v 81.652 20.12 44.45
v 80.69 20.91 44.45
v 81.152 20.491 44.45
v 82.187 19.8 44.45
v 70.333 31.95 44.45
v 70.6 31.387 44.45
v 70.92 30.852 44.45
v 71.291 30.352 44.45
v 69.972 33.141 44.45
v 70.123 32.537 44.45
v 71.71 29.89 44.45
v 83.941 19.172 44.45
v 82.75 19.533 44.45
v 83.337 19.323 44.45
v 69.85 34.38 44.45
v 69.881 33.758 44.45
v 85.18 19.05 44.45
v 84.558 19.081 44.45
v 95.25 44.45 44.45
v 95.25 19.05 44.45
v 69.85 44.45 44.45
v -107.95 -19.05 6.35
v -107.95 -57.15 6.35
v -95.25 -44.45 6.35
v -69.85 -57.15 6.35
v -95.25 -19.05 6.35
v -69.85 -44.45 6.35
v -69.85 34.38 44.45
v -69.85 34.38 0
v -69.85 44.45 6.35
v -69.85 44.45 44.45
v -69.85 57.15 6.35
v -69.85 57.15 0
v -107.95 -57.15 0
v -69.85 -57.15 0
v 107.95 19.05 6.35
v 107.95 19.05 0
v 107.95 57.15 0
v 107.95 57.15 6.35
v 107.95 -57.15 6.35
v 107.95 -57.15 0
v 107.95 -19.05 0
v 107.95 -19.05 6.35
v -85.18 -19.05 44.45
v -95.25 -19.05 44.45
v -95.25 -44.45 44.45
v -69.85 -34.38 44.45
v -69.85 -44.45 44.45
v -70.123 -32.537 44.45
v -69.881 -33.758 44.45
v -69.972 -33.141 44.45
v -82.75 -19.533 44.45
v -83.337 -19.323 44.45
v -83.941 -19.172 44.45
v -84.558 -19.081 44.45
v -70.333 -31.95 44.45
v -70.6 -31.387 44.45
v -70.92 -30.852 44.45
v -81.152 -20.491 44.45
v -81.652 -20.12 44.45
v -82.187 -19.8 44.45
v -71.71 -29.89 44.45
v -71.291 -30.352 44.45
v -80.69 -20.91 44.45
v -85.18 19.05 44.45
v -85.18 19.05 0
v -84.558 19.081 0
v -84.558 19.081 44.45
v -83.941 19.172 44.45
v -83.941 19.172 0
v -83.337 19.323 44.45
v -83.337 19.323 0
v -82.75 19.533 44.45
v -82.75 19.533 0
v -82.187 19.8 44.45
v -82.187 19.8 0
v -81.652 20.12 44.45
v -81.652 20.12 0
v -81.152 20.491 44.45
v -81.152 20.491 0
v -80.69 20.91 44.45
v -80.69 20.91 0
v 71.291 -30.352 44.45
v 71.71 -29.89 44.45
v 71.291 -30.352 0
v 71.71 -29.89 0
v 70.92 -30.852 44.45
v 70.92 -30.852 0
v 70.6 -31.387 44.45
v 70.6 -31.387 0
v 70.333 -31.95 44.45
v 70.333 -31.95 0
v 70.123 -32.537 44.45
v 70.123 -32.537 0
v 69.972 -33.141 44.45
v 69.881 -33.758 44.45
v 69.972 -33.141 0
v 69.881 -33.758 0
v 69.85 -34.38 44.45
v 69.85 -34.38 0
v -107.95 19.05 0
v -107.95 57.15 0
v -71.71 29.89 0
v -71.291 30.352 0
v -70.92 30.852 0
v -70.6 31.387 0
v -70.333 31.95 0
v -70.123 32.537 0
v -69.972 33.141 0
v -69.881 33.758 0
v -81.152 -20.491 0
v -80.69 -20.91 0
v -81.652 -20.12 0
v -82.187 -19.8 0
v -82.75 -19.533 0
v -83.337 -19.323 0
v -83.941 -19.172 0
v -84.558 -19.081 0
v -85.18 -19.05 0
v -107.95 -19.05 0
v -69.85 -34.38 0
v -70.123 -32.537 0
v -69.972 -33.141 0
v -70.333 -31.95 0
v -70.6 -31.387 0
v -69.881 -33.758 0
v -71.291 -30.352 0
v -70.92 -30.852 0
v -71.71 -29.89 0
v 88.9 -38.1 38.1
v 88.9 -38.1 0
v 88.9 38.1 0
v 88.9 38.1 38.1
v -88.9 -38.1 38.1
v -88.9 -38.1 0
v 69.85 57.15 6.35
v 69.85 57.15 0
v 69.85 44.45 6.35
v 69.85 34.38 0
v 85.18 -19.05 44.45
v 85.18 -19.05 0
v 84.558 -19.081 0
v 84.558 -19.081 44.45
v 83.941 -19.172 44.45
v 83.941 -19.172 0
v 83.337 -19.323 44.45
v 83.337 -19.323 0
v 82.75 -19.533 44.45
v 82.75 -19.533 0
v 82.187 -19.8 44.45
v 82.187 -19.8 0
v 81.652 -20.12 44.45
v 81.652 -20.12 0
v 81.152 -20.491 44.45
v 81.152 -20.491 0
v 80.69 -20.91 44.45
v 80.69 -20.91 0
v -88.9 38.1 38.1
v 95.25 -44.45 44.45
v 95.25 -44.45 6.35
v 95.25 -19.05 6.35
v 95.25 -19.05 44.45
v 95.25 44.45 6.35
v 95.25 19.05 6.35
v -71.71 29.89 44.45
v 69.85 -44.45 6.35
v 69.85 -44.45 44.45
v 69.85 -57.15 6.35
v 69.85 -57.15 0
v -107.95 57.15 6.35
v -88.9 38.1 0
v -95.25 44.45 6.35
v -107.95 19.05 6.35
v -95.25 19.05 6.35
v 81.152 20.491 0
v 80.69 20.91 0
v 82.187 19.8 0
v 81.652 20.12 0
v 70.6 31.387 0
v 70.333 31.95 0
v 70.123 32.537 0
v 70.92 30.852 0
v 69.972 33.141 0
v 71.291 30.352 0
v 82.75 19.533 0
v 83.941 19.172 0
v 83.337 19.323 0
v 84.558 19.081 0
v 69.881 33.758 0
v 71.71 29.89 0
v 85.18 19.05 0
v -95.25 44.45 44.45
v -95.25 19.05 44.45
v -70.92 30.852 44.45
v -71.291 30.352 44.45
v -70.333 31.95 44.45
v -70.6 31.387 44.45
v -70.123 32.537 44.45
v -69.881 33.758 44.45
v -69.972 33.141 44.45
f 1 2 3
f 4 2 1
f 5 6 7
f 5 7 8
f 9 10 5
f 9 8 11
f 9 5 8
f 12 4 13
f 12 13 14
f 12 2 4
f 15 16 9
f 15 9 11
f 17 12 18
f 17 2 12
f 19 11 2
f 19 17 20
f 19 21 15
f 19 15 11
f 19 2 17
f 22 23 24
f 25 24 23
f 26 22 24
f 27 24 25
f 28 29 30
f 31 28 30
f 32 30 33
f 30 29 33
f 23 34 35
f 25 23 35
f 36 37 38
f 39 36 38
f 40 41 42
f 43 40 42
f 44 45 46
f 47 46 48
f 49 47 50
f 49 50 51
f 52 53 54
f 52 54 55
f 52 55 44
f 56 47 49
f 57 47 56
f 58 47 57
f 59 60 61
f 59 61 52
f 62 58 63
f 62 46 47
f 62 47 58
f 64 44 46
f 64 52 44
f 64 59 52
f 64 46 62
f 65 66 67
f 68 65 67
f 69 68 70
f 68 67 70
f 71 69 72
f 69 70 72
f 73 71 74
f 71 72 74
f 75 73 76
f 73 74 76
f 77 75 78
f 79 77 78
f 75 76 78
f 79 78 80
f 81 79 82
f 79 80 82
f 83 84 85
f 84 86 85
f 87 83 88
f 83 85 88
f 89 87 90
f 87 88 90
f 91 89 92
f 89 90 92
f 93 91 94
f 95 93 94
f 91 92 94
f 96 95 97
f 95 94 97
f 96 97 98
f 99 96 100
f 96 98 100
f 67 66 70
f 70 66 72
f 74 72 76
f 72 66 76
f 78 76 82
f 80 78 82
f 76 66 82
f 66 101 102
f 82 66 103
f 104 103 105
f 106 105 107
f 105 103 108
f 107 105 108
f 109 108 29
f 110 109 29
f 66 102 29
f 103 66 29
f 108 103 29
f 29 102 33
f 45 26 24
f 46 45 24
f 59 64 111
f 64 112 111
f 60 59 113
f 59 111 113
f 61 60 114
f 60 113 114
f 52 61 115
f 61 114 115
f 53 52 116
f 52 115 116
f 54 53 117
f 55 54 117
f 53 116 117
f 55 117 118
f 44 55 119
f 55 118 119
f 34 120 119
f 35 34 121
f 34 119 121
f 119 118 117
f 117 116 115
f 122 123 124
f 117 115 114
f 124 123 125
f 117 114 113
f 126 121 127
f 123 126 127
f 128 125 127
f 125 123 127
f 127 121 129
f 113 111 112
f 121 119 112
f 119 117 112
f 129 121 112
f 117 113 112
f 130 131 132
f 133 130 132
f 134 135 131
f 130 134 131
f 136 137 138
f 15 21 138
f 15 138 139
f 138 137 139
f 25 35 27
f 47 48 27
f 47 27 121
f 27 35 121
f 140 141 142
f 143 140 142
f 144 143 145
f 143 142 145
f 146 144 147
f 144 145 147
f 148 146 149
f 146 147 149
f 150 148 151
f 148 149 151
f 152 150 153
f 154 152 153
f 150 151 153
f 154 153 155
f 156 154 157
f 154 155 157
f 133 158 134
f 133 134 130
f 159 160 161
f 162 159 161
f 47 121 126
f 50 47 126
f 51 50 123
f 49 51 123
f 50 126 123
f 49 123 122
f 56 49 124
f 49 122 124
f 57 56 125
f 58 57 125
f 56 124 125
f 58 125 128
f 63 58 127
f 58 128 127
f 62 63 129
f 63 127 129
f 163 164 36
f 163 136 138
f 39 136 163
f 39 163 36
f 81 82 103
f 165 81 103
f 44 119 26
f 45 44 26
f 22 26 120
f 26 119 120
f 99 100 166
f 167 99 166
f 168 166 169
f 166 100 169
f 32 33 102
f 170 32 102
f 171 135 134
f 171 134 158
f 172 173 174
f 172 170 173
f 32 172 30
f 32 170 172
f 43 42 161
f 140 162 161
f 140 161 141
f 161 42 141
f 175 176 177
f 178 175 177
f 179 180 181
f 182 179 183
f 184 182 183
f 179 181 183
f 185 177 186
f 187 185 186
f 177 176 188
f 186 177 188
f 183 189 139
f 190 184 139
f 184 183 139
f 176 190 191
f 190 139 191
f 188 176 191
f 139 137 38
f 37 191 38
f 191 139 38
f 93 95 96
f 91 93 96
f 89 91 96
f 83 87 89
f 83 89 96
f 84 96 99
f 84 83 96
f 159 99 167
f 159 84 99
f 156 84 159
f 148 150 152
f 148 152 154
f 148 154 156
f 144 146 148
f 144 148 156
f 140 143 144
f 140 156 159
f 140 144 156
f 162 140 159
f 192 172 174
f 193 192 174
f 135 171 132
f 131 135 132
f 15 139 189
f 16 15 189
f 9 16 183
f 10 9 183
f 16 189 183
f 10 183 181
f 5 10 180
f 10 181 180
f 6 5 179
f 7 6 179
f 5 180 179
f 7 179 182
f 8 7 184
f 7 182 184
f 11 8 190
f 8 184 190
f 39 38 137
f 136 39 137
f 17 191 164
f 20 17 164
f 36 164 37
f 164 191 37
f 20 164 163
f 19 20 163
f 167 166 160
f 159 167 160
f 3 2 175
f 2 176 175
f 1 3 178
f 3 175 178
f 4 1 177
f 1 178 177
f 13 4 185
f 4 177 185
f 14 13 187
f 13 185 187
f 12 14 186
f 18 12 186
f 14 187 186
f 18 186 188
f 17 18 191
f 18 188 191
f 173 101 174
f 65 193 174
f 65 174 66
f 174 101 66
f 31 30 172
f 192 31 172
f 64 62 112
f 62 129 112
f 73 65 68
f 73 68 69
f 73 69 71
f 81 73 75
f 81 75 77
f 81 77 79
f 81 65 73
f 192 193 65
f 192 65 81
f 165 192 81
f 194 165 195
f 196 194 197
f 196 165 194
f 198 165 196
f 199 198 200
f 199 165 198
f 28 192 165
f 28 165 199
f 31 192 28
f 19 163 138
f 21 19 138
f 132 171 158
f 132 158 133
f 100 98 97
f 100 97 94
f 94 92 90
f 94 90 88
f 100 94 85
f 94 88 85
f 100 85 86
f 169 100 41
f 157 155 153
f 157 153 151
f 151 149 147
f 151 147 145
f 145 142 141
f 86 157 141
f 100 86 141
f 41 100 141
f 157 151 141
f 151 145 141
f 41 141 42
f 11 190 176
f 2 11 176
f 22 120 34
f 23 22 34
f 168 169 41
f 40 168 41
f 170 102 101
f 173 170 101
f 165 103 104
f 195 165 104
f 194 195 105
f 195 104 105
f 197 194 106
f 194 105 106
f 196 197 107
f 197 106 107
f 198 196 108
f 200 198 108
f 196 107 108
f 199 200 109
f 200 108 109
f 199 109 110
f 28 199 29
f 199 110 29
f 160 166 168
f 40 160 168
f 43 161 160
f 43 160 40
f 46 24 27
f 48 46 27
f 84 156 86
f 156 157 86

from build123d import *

# Parameters (mm, degrees)
F0_W     = 177.8
F0_H     = 76.2
F1_DEPTH = 38.1
F3_DEPTH = 38.1
F5_DEPTH = 6.35
F6_DEPTH = 6.35


with BuildPart() as f1:
    # F0 (on Top) → F1 (new body)
    with BuildSketch(Plane.XY):
        Rectangle(F0_W, F0_H)
    extrude(amount=F1_DEPTH)


with BuildPart() as f3:
    # F2 (on Top) → F3 (new body, through all)
    with BuildSketch(Plane.XY):
        Polygon((-69.85, -38.1), (-88.9, -38.1), (-88.9, -19.05), (-95.25, -19.05), (-95.25, -44.45), (-69.85, -44.45), align=None)
        with BuildLine():
            Line((-88.9, -19.05), (-88.9, -38.1))
            Line((-88.9, -38.1), (-69.85, -38.1))
            Line((-69.85, -38.1), (-69.85, -34.3802561211))
            ThreePointArc((-69.85, -34.3802561211), (-70.3333649686, -31.9502163256), (-71.7098719395, -29.8901280605))
            Line((-71.7098719395, -29.8901280605), (-80.6901280605, -20.9098719395))
            ThreePointArc((-80.6901280605, -20.9098719395), (-82.7502163256, -19.5333649686), (-85.1802561211, -19.05))
            Line((-85.1802561211, -19.05), (-88.9, -19.05))
        make_face()
    extrude(amount=F3_DEPTH)

    # F4 (on face) → F5 (join)
    with BuildSketch(Plane.XY.offset(38.1)):
        with BuildLine():
            Line((-88.9, -38.1), (-69.85, -38.1))
            Line((-69.85, -38.1), (-69.85, -34.3802561211))
            ThreePointArc((-69.85, -34.3802561211), (-70.3333649686, -31.9502163256), (-71.7098719395, -29.8901280605))
            Line((-71.7098719395, -29.8901280605), (-80.6901280605, -20.9098719395))
            ThreePointArc((-80.6901280605, -20.9098719395), (-82.7502163256, -19.5333649686), (-85.1802561211, -19.05))
            Line((-85.1802561211, -19.05), (-88.9, -19.05))
            Line((-88.9, -19.05), (-88.9, -38.1))
        make_face()
        Polygon((-69.85, -44.45), (-69.85, -38.1), (-88.9, -38.1), (-88.9, -19.05), (-95.25, -19.05), (-95.25, -44.45), align=None)
    extrude(amount=F5_DEPTH)

    # F2 (on Top) → F6, piece 4 (join)
    with BuildSketch(Plane.XY):
        Polygon((-69.85, -57.15), (-69.85, -44.45), (-95.25, -44.45), (-95.25, -19.05), (-107.95, -19.05), (-107.95, -57.15), align=None)
    extrude(amount=F6_DEPTH)


with BuildPart() as f3b:
    # F2 (on Top) → F3, piece 2 (new body, through all)
    with BuildSketch(Plane.XY):
        with BuildLine():
            Line((-88.9, 38.1), (-88.9, 19.05))
            Line((-88.9, 19.05), (-85.1802561211, 19.05))
            ThreePointArc((-85.1802561211, 19.05), (-82.7502163256, 19.5333649686), (-80.6901280605, 20.9098719395))
            Line((-80.6901280605, 20.9098719395), (-71.7098719395, 29.8901280605))
            ThreePointArc((-71.7098719395, 29.8901280605), (-70.3333649686, 31.9502163256), (-69.85, 34.3802561211))
            Line((-69.85, 34.3802561211), (-69.85, 38.1))
            Line((-69.85, 38.1), (-88.9, 38.1))
        make_face()
        Polygon((-95.25, 19.05), (-88.9, 19.05), (-88.9, 38.1), (-69.85, 38.1), (-69.85, 44.45), (-95.25, 44.45), align=None)
    extrude(amount=F3_DEPTH)

    # F4 (on face) → F5, piece 2 (join)
    with BuildSketch(Plane.XY.offset(38.1)):
        with BuildLine():
            ThreePointArc((-71.7098719395, 29.8901280605), (-70.3333649686, 31.9502163256), (-69.85, 34.3802561211))
            Line((-69.85, 34.3802561211), (-69.85, 38.1))
            Line((-69.85, 38.1), (-88.9, 38.1))
            Line((-88.9, 38.1), (-88.9, 19.05))
            Line((-88.9, 19.05), (-85.1802561211, 19.05))
            ThreePointArc((-85.1802561211, 19.05), (-82.7502163256, 19.5333649686), (-80.6901280605, 20.9098719395))
            Line((-80.6901280605, 20.9098719395), (-71.7098719395, 29.8901280605))
        make_face()
        Polygon((-88.9, 38.1), (-69.85, 38.1), (-69.85, 44.45), (-95.25, 44.45), (-95.25, 19.05), (-88.9, 19.05), align=None)
    extrude(amount=F5_DEPTH)

    # F2 (on Top) → F6, piece 2 (join)
    with BuildSketch(Plane.XY):
        Polygon((-107.95, 19.05), (-95.25, 19.05), (-95.25, 44.45), (-69.85, 44.45), (-69.85, 57.15), (-107.95, 57.15), align=None)
    extrude(amount=F6_DEPTH)


with BuildPart() as f3c:
    # F2 (on Top) → F3, piece 3 (new body, through all)
    with BuildSketch(Plane.XY):
        with BuildLine():
            Line((69.85, -34.3802561211), (69.85, -38.1))
            Line((69.85, -38.1), (88.9, -38.1))
            Line((88.9, -38.1), (88.9, -19.05))
            Line((88.9, -19.05), (85.1802561211, -19.05))
            ThreePointArc((85.1802561211, -19.05), (82.7502163256, -19.5333649686), (80.6901280605, -20.9098719395))
            Line((80.6901280605, -20.9098719395), (71.7098719395, -29.8901280605))
            ThreePointArc((71.7098719395, -29.8901280605), (70.3333649686, -31.9502163256), (69.85, -34.3802561211))
        make_face()
        Polygon((88.9, -38.1), (69.85, -38.1), (69.85, -44.45), (95.25, -44.45), (95.25, -19.05), (88.9, -19.05), align=None)
    extrude(amount=F3_DEPTH)

    # F4 (on face) → F5, piece 3 (join)
    with BuildSketch(Plane.XY.offset(38.1)):
        with BuildLine():
            Line((88.9, -38.1), (88.9, -19.05))
            Line((88.9, -19.05), (85.1802561211, -19.05))
            ThreePointArc((85.1802561211, -19.05), (82.7502163256, -19.5333649686), (80.6901280605, -20.9098719395))
            Line((80.6901280605, -20.9098719395), (71.7098719395, -29.8901280605))
            ThreePointArc((71.7098719395, -29.8901280605), (70.3333649686, -31.9502163256), (69.85, -34.3802561211))
            Line((69.85, -34.3802561211), (69.85, -38.1))
            Line((69.85, -38.1), (88.9, -38.1))
        make_face()
        Polygon((95.25, -19.05), (88.9, -19.05), (88.9, -38.1), (69.85, -38.1), (69.85, -44.45), (95.25, -44.45), align=None)
    extrude(amount=F5_DEPTH)

    # F2 (on Top) → F6, piece 3 (join)
    with BuildSketch(Plane.XY):
        Polygon((95.25, -44.45), (69.85, -44.45), (69.85, -57.15), (107.95, -57.15), (107.95, -19.05), (95.25, -19.05), align=None)
    extrude(amount=F6_DEPTH)


with BuildPart() as f3d:
    # F2 (on Top) → F3, piece 4 (new body, through all)
    with BuildSketch(Plane.XY):
        with BuildLine():
            Line((85.1802561211, 19.05), (88.9, 19.05))
            Line((88.9, 19.05), (88.9, 38.1))
            Line((88.9, 38.1), (69.85, 38.1))
            Line((69.85, 38.1), (69.85, 34.3802561211))
            ThreePointArc((69.85, 34.3802561211), (70.3333649686, 31.9502163256), (71.7098719395, 29.8901280605))
            Line((71.7098719395, 29.8901280605), (80.6901280605, 20.9098719395))
            ThreePointArc((80.6901280605, 20.9098719395), (82.7502163256, 19.5333649686), (85.1802561211, 19.05))
        make_face()
        Polygon((88.9, 38.1), (88.9, 19.05), (95.25, 19.05), (95.25, 44.45), (69.85, 44.45), (69.85, 38.1), align=None)
    extrude(amount=F3_DEPTH)

    # F4 (on face) → F5, piece 4 (join)
    with BuildSketch(Plane.XY.offset(38.1)):
        with BuildLine():
            Line((71.7098719395, 29.8901280605), (80.6901280605, 20.9098719395))
            ThreePointArc((80.6901280605, 20.9098719395), (82.7502163256, 19.5333649686), (85.1802561211, 19.05))
            Line((85.1802561211, 19.05), (88.9, 19.05))
            Line((88.9, 19.05), (88.9, 38.1))
            Line((88.9, 38.1), (69.85, 38.1))
            Line((69.85, 38.1), (69.85, 34.3802561211))
            ThreePointArc((69.85, 34.3802561211), (70.3333649686, 31.9502163256), (71.7098719395, 29.8901280605))
        make_face()
        Polygon((88.9, 38.1), (88.9, 19.05), (95.25, 19.05), (95.25, 44.45), (69.85, 44.45), (69.85, 38.1), align=None)
    extrude(amount=F5_DEPTH)

    # F2 (on Top) → F6 (join)
    with BuildSketch(Plane.XY):
        Polygon((95.25, 44.45), (95.25, 19.05), (107.95, 19.05), (107.95, 57.15), (69.85, 57.15), (69.85, 44.45), align=None)
    extrude(amount=F6_DEPTH)


solid = Compound([f1.part, f3.part, f3b.part, f3c.part, f3d.part])
